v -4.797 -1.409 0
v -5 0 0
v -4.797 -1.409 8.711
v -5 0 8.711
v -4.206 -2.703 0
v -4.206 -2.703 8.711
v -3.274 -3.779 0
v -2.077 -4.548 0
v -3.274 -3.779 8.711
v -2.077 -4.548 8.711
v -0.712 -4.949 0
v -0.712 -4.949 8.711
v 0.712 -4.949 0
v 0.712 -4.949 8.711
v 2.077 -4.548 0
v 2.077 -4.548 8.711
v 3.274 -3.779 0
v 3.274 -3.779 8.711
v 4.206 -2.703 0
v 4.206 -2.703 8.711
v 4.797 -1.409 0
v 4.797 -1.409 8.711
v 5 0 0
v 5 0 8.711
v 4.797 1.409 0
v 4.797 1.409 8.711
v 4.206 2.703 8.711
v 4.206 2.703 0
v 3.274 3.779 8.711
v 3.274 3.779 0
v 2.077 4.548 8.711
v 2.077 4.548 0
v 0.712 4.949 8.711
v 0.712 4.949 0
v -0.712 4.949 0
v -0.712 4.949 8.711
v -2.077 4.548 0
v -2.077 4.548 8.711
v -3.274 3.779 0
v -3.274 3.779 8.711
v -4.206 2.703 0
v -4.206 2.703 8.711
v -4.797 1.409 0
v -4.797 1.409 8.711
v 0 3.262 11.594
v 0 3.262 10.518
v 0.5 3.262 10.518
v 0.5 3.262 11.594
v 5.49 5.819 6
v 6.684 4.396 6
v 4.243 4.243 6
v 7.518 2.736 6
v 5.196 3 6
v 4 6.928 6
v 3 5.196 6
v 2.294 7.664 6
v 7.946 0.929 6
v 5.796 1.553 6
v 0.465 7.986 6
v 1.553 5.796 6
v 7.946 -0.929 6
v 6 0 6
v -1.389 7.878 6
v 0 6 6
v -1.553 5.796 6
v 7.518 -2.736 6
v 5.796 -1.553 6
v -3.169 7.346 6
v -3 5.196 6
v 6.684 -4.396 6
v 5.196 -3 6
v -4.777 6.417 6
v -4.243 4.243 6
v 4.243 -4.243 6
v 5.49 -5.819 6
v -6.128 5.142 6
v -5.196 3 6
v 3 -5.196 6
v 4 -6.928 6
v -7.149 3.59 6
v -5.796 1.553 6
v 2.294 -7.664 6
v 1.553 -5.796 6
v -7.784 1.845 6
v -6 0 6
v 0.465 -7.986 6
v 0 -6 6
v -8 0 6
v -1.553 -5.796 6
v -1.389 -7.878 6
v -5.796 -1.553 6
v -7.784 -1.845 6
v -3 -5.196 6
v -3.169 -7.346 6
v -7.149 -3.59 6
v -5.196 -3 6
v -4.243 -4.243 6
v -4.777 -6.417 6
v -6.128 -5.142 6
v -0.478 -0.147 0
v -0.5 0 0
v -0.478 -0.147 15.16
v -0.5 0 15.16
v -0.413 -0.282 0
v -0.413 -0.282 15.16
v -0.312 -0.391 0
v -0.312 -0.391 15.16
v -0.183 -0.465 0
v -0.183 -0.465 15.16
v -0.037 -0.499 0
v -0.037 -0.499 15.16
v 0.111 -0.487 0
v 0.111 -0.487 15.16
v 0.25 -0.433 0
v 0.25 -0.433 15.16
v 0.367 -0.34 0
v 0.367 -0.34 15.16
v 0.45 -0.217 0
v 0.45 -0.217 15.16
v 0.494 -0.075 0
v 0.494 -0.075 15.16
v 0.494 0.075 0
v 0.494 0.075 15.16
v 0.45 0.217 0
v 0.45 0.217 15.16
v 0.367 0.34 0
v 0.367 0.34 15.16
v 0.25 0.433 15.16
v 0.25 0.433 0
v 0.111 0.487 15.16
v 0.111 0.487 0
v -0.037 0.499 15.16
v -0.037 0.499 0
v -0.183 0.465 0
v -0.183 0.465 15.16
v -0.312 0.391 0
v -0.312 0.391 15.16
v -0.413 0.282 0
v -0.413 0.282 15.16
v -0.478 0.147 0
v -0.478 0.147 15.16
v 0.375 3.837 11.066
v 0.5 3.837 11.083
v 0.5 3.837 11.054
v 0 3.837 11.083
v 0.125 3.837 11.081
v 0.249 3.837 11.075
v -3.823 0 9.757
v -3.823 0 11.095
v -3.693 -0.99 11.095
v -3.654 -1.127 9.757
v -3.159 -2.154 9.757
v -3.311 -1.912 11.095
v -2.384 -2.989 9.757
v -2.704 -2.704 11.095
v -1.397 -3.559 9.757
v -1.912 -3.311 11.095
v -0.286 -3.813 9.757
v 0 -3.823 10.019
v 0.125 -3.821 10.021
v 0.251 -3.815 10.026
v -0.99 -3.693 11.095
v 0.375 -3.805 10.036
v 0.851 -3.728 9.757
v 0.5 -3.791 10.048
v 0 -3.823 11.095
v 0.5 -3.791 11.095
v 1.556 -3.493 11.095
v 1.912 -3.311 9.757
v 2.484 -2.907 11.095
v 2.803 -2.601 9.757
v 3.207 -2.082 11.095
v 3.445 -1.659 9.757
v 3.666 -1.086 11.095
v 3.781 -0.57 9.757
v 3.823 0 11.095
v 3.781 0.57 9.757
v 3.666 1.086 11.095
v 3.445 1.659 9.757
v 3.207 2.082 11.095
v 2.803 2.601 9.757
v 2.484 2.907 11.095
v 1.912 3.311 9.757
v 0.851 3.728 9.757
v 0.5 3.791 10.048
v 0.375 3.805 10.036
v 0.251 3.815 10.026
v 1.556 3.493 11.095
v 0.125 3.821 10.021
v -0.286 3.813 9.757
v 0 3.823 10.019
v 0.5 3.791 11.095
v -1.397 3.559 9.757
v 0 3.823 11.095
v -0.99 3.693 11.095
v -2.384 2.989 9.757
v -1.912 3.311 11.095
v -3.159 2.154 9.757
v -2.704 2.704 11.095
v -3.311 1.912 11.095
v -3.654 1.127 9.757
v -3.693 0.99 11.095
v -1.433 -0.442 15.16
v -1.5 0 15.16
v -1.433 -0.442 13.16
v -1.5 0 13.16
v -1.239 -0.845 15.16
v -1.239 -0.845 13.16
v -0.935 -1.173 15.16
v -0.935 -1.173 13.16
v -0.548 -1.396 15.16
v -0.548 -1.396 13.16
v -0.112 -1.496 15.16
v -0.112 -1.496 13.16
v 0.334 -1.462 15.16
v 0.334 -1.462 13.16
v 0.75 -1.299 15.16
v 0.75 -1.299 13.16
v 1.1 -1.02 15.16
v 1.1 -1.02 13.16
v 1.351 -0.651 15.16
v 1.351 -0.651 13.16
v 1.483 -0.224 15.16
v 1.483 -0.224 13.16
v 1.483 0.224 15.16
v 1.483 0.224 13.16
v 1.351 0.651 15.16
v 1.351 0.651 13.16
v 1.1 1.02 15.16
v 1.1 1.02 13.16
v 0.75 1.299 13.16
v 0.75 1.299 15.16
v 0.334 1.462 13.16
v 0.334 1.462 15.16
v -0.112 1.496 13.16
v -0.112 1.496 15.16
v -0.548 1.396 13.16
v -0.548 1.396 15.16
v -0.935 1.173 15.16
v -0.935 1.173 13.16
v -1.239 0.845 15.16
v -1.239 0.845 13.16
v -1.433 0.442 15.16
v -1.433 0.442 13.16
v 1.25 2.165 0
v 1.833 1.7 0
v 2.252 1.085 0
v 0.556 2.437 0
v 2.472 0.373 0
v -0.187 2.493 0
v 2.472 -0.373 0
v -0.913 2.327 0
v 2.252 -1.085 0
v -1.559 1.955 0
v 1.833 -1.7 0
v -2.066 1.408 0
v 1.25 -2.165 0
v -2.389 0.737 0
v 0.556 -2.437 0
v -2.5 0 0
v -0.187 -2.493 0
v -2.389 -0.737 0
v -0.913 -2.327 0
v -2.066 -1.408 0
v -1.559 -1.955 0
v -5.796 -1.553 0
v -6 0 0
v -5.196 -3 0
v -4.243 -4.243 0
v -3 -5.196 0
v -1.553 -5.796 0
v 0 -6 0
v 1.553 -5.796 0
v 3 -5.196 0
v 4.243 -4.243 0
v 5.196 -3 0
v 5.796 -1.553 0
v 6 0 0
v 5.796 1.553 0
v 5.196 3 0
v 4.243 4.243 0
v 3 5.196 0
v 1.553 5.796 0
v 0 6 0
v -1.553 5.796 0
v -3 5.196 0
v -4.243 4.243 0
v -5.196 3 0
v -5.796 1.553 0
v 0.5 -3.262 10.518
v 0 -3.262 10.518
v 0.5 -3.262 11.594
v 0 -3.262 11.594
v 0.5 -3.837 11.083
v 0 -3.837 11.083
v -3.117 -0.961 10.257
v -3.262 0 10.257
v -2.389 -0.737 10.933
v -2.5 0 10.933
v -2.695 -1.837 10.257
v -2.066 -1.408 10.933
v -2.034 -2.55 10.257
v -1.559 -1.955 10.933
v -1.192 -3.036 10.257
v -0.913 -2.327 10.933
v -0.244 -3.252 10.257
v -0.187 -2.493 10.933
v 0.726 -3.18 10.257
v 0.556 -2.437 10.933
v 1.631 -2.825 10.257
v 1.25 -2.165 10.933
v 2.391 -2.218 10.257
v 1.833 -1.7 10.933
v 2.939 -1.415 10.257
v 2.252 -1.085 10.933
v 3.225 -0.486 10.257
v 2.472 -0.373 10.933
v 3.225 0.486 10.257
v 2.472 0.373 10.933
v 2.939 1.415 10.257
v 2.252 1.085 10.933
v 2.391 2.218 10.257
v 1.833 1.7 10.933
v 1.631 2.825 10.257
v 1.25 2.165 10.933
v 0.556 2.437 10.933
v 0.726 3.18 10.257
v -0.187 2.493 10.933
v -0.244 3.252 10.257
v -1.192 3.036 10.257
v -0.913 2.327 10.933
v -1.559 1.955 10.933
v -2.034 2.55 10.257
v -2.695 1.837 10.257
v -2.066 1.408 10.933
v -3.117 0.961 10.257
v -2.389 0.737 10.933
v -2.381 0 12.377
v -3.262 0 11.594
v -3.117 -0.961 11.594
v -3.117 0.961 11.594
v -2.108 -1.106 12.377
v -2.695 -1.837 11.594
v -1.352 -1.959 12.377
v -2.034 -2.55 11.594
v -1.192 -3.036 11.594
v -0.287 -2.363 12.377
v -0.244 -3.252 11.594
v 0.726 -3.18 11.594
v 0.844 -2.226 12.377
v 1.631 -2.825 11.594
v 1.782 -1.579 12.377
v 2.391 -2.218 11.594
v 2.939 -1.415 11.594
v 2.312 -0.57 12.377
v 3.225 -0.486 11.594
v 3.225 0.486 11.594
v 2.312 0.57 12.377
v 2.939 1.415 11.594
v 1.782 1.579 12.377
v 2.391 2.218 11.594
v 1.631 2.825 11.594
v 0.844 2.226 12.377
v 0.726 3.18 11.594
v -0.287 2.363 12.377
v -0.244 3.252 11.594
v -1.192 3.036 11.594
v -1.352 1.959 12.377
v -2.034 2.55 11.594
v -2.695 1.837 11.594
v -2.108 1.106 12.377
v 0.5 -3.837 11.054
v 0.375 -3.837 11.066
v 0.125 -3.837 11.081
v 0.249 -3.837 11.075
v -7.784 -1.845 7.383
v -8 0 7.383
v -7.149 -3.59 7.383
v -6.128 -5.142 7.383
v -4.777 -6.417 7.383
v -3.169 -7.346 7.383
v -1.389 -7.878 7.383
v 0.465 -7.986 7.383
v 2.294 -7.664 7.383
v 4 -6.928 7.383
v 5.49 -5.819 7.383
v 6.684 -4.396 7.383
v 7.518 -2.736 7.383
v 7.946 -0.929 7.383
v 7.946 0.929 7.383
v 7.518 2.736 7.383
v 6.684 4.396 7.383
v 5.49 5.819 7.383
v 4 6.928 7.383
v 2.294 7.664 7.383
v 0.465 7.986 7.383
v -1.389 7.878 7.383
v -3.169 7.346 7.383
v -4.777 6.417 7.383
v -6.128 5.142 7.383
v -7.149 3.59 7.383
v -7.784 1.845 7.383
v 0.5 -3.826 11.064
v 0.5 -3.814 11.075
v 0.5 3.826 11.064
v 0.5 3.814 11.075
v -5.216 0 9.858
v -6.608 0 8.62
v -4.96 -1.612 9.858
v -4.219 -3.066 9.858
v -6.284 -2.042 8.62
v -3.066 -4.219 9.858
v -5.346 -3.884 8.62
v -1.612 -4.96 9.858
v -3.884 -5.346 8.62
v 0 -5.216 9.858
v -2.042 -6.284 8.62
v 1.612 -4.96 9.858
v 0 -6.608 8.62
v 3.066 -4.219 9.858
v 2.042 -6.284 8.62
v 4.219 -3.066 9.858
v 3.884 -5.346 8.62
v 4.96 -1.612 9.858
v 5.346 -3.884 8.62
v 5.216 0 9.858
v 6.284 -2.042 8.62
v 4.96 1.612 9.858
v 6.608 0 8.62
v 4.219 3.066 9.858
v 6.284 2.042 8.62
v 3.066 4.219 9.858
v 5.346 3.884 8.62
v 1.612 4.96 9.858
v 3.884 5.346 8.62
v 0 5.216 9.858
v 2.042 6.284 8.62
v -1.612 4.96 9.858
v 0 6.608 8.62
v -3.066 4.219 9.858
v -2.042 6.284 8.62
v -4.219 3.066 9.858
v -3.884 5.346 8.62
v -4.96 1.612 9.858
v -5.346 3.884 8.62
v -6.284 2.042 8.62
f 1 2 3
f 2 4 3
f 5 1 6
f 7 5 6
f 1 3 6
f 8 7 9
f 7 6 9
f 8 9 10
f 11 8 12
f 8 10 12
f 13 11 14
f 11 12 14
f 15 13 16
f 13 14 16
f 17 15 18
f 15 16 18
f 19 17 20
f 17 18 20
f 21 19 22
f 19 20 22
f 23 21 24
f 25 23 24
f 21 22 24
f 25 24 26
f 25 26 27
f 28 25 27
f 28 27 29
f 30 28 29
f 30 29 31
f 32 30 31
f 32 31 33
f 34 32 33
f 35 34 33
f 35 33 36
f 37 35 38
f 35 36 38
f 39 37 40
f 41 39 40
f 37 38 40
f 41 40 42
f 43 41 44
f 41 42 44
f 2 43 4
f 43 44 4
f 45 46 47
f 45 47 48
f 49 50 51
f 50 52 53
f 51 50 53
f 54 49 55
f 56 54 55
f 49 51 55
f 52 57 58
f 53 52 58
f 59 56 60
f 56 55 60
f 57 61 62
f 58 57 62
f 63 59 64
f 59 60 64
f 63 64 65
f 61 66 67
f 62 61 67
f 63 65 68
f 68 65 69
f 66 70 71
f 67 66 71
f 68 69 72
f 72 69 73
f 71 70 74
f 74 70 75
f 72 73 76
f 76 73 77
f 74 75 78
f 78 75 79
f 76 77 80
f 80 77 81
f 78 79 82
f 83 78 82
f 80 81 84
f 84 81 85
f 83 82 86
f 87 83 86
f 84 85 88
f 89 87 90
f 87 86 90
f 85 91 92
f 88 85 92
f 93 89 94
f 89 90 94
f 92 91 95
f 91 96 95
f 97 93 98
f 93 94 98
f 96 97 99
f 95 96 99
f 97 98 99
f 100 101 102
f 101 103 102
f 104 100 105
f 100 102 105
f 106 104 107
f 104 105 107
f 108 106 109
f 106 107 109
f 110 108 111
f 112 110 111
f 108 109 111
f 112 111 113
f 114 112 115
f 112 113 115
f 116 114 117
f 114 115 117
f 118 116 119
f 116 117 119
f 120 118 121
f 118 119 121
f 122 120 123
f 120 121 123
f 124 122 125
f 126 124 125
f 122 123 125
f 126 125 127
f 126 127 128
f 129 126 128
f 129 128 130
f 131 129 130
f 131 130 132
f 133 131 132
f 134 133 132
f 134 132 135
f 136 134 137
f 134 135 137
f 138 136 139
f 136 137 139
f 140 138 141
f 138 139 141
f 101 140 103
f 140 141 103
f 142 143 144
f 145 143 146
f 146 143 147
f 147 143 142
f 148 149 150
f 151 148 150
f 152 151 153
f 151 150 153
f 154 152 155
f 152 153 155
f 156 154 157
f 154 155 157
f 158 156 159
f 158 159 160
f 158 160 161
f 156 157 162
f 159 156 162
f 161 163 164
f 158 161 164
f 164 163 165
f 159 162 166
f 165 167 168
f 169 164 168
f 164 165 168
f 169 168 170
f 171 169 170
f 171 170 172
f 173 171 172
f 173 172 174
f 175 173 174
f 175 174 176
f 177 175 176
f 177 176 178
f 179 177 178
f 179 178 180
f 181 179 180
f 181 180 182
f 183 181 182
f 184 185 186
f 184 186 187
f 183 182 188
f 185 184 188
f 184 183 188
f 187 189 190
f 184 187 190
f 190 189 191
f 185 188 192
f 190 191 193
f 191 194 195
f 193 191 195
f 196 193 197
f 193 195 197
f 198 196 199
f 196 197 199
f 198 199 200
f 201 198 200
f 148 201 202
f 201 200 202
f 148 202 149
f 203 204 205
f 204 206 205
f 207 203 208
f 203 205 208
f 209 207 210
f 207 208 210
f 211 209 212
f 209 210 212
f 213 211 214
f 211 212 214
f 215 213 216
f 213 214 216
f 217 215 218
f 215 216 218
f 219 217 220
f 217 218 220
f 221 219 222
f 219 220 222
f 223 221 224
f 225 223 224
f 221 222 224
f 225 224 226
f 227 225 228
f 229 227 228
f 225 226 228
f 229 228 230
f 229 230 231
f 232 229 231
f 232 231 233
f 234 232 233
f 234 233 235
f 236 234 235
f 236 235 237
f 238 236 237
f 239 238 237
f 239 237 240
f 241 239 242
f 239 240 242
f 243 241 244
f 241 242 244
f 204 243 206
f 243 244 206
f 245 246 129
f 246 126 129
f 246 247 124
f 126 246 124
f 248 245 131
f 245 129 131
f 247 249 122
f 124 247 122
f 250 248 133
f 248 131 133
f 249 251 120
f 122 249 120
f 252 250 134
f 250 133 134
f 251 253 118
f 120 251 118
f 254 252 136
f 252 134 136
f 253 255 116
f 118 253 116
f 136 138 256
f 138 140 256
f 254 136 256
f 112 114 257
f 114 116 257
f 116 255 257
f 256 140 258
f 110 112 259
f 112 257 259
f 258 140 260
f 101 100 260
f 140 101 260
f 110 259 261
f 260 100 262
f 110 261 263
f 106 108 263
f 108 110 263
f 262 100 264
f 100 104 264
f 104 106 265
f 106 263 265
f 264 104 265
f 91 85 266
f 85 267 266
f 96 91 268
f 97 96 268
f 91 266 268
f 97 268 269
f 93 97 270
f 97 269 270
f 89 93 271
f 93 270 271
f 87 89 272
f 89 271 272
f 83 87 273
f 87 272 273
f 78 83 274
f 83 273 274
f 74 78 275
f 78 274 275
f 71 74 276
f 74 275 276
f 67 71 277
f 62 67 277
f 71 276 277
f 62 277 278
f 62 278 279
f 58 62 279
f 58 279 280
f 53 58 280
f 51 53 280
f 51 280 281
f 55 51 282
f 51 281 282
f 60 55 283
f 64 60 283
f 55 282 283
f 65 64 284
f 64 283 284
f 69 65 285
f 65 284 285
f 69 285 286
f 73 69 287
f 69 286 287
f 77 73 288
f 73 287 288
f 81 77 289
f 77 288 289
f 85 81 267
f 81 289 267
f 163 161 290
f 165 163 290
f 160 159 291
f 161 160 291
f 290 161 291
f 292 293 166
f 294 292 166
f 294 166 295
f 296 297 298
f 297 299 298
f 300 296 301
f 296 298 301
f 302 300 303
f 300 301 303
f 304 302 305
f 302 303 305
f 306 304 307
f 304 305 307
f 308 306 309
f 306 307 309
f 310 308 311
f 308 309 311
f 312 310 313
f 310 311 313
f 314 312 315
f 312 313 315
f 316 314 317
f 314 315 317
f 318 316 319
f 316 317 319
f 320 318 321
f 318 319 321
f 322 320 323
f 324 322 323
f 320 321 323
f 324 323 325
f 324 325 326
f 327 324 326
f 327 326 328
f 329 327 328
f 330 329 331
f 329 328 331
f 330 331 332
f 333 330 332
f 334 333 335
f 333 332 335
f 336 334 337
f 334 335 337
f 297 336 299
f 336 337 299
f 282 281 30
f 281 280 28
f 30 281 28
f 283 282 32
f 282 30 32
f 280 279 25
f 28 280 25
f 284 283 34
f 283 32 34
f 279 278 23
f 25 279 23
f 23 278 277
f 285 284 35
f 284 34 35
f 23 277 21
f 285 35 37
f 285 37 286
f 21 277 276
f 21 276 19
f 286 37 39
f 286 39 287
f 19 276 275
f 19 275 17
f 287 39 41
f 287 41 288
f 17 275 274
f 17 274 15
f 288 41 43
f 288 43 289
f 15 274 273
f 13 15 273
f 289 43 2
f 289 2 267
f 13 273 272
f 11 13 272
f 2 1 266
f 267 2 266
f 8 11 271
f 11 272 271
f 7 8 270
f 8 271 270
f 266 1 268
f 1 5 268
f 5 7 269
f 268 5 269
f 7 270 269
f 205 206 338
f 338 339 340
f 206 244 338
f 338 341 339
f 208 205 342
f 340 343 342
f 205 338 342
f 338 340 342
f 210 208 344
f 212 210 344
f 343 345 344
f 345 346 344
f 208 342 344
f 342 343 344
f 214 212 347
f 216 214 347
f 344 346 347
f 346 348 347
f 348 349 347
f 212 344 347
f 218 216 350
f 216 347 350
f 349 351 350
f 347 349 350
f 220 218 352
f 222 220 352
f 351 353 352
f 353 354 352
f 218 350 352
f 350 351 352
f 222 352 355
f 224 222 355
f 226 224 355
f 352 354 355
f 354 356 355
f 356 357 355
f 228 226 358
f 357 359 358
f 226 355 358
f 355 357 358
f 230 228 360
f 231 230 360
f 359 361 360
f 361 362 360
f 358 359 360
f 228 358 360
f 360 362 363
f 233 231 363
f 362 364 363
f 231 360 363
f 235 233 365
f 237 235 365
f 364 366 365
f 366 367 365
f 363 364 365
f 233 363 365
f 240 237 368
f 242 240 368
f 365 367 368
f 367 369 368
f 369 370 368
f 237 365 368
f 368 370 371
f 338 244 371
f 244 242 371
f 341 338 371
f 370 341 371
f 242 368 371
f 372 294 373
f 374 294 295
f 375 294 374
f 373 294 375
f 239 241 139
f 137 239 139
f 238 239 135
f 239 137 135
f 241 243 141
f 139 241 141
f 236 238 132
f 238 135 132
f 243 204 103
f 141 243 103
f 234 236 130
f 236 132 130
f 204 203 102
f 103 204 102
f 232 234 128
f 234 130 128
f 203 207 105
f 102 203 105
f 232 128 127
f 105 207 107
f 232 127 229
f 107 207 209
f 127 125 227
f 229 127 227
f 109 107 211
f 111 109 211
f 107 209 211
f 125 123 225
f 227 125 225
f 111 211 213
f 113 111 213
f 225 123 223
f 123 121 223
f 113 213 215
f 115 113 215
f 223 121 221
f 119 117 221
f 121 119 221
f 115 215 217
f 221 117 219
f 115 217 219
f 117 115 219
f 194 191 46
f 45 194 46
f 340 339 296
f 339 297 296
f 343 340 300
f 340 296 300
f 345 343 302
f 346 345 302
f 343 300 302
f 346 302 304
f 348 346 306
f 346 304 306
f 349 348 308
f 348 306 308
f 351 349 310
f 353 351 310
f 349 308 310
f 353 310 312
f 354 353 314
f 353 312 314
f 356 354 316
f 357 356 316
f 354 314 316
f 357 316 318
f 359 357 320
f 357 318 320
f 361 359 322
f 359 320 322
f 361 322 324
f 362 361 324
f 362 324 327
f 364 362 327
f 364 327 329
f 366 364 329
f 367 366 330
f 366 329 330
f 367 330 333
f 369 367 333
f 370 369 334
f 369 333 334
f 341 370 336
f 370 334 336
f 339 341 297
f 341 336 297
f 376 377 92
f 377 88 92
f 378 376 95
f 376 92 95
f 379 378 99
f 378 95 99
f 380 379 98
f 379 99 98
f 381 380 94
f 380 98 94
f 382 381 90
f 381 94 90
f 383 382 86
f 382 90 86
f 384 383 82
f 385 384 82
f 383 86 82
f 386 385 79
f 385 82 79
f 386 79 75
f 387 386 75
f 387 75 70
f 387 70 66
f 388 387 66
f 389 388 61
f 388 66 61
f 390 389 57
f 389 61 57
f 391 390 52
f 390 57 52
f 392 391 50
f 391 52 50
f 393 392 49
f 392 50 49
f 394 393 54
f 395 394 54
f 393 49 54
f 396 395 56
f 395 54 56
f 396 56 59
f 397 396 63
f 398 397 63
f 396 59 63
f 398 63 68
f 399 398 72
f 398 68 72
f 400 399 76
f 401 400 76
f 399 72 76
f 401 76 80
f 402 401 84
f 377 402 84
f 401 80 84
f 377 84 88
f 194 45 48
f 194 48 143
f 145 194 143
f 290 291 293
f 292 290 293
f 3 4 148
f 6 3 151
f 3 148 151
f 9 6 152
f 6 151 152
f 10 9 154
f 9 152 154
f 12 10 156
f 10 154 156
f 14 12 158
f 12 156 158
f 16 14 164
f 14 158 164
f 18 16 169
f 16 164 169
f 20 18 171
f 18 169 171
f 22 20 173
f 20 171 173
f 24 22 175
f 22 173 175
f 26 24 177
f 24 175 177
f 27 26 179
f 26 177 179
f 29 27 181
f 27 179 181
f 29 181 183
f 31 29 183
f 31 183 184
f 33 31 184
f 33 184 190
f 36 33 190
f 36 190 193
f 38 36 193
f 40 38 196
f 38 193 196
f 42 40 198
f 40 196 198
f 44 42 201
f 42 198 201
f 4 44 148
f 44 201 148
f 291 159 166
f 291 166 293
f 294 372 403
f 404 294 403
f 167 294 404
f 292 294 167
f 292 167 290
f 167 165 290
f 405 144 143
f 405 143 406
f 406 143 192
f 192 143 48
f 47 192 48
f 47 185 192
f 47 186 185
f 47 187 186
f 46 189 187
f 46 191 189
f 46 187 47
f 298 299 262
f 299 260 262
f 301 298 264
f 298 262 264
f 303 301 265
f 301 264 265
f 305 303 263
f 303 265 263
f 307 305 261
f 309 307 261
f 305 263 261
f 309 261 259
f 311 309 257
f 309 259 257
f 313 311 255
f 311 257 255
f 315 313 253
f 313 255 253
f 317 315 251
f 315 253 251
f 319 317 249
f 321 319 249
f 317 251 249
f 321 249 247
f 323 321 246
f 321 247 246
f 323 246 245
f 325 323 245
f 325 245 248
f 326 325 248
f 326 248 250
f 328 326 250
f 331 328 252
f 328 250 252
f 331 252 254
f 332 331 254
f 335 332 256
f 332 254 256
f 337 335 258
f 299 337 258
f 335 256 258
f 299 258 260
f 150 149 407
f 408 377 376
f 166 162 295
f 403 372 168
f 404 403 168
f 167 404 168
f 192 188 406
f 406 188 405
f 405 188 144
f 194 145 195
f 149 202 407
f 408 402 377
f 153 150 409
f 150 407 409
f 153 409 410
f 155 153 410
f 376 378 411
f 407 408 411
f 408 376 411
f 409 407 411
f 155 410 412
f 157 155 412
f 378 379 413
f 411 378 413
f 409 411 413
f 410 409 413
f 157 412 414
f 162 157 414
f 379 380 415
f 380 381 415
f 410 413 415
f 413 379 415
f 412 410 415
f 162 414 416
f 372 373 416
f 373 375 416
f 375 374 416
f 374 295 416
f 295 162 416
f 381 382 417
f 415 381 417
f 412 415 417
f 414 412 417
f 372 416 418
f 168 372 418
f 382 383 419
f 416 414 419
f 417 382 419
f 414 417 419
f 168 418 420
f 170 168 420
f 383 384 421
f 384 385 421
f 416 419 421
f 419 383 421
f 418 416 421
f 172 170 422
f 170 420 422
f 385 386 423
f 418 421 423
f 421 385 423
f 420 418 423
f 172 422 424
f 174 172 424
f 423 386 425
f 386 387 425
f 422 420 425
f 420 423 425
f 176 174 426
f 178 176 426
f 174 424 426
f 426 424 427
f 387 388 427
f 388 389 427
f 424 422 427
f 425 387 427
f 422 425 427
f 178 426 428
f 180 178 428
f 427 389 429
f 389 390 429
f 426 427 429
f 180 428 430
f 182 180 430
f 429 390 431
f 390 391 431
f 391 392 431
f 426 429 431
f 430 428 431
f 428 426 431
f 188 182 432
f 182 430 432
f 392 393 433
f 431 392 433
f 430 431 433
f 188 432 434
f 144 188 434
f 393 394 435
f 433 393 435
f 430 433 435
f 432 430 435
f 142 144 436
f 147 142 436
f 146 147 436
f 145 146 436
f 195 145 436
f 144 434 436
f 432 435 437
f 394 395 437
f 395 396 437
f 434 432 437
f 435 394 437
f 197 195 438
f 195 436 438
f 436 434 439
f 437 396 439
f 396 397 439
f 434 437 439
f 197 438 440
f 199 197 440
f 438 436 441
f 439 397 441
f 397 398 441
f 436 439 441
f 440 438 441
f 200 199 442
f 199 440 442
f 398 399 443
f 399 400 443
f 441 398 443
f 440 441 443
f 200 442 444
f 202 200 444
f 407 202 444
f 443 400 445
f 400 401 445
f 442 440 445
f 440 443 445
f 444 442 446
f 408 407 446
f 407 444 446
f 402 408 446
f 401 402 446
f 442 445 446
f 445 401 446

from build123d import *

# Parameters (mm, degrees)
F3_DEPTH = 0.5


# Not quite as in the source:
# - a pattern or mirror of a feature is missing from the dataset's text; its kind, count and spacing are read off the source's solid


with BuildPart() as f1:
    # F0 (on Front) → F1 (revolve)
    with BuildSketch(Plane.XZ):
        Polygon((-6, 6), (-6, 0), (-5, 0), (-5, 8.7112633561), (-3.8233768799, 9.7571505739), (-3.8233768799, 11.0951055271), (-8, 7.3825516426), (-8, 6), align=None)
    revolve(axis=Axis((0, 0, 1.3750899837), (0, 0, 1)))

    # F2 (on Right) → F3 (join)
    with BuildSketch(Plane.YZ):
        Polygon((-3.261596497, 10.5184856802), (-3.261596497, 11.5944658675), (-3.8373894771, 11.0826498851), (-3.8373894771, 10.0066696978), align=None)
    f3 = extrude(amount=F3_DEPTH)

    # F3_copies: F3 across plane
    add(f3.mirror(Plane.ZX))


with BuildPart() as f1b:
    # F0 (on Front) → F1, piece 2 (revolve)
    with BuildSketch(Plane.XZ):
        Polygon((-1.5, 15.1603294204), (-1.5, 13.1603294204), (-3.261596497, 11.5944658675), (-3.261596497, 10.2565109143), (-2.5, 10.9334855783), (-2.5, 0), (-0.5, 0), (-0.5, 12.7112633561), (-0.5, 15.1603294204), align=None)
    revolve(axis=Axis((0, 0, 1.3750899837), (0, 0, 1)))


solid = Compound([f1.part, f1b.part])
